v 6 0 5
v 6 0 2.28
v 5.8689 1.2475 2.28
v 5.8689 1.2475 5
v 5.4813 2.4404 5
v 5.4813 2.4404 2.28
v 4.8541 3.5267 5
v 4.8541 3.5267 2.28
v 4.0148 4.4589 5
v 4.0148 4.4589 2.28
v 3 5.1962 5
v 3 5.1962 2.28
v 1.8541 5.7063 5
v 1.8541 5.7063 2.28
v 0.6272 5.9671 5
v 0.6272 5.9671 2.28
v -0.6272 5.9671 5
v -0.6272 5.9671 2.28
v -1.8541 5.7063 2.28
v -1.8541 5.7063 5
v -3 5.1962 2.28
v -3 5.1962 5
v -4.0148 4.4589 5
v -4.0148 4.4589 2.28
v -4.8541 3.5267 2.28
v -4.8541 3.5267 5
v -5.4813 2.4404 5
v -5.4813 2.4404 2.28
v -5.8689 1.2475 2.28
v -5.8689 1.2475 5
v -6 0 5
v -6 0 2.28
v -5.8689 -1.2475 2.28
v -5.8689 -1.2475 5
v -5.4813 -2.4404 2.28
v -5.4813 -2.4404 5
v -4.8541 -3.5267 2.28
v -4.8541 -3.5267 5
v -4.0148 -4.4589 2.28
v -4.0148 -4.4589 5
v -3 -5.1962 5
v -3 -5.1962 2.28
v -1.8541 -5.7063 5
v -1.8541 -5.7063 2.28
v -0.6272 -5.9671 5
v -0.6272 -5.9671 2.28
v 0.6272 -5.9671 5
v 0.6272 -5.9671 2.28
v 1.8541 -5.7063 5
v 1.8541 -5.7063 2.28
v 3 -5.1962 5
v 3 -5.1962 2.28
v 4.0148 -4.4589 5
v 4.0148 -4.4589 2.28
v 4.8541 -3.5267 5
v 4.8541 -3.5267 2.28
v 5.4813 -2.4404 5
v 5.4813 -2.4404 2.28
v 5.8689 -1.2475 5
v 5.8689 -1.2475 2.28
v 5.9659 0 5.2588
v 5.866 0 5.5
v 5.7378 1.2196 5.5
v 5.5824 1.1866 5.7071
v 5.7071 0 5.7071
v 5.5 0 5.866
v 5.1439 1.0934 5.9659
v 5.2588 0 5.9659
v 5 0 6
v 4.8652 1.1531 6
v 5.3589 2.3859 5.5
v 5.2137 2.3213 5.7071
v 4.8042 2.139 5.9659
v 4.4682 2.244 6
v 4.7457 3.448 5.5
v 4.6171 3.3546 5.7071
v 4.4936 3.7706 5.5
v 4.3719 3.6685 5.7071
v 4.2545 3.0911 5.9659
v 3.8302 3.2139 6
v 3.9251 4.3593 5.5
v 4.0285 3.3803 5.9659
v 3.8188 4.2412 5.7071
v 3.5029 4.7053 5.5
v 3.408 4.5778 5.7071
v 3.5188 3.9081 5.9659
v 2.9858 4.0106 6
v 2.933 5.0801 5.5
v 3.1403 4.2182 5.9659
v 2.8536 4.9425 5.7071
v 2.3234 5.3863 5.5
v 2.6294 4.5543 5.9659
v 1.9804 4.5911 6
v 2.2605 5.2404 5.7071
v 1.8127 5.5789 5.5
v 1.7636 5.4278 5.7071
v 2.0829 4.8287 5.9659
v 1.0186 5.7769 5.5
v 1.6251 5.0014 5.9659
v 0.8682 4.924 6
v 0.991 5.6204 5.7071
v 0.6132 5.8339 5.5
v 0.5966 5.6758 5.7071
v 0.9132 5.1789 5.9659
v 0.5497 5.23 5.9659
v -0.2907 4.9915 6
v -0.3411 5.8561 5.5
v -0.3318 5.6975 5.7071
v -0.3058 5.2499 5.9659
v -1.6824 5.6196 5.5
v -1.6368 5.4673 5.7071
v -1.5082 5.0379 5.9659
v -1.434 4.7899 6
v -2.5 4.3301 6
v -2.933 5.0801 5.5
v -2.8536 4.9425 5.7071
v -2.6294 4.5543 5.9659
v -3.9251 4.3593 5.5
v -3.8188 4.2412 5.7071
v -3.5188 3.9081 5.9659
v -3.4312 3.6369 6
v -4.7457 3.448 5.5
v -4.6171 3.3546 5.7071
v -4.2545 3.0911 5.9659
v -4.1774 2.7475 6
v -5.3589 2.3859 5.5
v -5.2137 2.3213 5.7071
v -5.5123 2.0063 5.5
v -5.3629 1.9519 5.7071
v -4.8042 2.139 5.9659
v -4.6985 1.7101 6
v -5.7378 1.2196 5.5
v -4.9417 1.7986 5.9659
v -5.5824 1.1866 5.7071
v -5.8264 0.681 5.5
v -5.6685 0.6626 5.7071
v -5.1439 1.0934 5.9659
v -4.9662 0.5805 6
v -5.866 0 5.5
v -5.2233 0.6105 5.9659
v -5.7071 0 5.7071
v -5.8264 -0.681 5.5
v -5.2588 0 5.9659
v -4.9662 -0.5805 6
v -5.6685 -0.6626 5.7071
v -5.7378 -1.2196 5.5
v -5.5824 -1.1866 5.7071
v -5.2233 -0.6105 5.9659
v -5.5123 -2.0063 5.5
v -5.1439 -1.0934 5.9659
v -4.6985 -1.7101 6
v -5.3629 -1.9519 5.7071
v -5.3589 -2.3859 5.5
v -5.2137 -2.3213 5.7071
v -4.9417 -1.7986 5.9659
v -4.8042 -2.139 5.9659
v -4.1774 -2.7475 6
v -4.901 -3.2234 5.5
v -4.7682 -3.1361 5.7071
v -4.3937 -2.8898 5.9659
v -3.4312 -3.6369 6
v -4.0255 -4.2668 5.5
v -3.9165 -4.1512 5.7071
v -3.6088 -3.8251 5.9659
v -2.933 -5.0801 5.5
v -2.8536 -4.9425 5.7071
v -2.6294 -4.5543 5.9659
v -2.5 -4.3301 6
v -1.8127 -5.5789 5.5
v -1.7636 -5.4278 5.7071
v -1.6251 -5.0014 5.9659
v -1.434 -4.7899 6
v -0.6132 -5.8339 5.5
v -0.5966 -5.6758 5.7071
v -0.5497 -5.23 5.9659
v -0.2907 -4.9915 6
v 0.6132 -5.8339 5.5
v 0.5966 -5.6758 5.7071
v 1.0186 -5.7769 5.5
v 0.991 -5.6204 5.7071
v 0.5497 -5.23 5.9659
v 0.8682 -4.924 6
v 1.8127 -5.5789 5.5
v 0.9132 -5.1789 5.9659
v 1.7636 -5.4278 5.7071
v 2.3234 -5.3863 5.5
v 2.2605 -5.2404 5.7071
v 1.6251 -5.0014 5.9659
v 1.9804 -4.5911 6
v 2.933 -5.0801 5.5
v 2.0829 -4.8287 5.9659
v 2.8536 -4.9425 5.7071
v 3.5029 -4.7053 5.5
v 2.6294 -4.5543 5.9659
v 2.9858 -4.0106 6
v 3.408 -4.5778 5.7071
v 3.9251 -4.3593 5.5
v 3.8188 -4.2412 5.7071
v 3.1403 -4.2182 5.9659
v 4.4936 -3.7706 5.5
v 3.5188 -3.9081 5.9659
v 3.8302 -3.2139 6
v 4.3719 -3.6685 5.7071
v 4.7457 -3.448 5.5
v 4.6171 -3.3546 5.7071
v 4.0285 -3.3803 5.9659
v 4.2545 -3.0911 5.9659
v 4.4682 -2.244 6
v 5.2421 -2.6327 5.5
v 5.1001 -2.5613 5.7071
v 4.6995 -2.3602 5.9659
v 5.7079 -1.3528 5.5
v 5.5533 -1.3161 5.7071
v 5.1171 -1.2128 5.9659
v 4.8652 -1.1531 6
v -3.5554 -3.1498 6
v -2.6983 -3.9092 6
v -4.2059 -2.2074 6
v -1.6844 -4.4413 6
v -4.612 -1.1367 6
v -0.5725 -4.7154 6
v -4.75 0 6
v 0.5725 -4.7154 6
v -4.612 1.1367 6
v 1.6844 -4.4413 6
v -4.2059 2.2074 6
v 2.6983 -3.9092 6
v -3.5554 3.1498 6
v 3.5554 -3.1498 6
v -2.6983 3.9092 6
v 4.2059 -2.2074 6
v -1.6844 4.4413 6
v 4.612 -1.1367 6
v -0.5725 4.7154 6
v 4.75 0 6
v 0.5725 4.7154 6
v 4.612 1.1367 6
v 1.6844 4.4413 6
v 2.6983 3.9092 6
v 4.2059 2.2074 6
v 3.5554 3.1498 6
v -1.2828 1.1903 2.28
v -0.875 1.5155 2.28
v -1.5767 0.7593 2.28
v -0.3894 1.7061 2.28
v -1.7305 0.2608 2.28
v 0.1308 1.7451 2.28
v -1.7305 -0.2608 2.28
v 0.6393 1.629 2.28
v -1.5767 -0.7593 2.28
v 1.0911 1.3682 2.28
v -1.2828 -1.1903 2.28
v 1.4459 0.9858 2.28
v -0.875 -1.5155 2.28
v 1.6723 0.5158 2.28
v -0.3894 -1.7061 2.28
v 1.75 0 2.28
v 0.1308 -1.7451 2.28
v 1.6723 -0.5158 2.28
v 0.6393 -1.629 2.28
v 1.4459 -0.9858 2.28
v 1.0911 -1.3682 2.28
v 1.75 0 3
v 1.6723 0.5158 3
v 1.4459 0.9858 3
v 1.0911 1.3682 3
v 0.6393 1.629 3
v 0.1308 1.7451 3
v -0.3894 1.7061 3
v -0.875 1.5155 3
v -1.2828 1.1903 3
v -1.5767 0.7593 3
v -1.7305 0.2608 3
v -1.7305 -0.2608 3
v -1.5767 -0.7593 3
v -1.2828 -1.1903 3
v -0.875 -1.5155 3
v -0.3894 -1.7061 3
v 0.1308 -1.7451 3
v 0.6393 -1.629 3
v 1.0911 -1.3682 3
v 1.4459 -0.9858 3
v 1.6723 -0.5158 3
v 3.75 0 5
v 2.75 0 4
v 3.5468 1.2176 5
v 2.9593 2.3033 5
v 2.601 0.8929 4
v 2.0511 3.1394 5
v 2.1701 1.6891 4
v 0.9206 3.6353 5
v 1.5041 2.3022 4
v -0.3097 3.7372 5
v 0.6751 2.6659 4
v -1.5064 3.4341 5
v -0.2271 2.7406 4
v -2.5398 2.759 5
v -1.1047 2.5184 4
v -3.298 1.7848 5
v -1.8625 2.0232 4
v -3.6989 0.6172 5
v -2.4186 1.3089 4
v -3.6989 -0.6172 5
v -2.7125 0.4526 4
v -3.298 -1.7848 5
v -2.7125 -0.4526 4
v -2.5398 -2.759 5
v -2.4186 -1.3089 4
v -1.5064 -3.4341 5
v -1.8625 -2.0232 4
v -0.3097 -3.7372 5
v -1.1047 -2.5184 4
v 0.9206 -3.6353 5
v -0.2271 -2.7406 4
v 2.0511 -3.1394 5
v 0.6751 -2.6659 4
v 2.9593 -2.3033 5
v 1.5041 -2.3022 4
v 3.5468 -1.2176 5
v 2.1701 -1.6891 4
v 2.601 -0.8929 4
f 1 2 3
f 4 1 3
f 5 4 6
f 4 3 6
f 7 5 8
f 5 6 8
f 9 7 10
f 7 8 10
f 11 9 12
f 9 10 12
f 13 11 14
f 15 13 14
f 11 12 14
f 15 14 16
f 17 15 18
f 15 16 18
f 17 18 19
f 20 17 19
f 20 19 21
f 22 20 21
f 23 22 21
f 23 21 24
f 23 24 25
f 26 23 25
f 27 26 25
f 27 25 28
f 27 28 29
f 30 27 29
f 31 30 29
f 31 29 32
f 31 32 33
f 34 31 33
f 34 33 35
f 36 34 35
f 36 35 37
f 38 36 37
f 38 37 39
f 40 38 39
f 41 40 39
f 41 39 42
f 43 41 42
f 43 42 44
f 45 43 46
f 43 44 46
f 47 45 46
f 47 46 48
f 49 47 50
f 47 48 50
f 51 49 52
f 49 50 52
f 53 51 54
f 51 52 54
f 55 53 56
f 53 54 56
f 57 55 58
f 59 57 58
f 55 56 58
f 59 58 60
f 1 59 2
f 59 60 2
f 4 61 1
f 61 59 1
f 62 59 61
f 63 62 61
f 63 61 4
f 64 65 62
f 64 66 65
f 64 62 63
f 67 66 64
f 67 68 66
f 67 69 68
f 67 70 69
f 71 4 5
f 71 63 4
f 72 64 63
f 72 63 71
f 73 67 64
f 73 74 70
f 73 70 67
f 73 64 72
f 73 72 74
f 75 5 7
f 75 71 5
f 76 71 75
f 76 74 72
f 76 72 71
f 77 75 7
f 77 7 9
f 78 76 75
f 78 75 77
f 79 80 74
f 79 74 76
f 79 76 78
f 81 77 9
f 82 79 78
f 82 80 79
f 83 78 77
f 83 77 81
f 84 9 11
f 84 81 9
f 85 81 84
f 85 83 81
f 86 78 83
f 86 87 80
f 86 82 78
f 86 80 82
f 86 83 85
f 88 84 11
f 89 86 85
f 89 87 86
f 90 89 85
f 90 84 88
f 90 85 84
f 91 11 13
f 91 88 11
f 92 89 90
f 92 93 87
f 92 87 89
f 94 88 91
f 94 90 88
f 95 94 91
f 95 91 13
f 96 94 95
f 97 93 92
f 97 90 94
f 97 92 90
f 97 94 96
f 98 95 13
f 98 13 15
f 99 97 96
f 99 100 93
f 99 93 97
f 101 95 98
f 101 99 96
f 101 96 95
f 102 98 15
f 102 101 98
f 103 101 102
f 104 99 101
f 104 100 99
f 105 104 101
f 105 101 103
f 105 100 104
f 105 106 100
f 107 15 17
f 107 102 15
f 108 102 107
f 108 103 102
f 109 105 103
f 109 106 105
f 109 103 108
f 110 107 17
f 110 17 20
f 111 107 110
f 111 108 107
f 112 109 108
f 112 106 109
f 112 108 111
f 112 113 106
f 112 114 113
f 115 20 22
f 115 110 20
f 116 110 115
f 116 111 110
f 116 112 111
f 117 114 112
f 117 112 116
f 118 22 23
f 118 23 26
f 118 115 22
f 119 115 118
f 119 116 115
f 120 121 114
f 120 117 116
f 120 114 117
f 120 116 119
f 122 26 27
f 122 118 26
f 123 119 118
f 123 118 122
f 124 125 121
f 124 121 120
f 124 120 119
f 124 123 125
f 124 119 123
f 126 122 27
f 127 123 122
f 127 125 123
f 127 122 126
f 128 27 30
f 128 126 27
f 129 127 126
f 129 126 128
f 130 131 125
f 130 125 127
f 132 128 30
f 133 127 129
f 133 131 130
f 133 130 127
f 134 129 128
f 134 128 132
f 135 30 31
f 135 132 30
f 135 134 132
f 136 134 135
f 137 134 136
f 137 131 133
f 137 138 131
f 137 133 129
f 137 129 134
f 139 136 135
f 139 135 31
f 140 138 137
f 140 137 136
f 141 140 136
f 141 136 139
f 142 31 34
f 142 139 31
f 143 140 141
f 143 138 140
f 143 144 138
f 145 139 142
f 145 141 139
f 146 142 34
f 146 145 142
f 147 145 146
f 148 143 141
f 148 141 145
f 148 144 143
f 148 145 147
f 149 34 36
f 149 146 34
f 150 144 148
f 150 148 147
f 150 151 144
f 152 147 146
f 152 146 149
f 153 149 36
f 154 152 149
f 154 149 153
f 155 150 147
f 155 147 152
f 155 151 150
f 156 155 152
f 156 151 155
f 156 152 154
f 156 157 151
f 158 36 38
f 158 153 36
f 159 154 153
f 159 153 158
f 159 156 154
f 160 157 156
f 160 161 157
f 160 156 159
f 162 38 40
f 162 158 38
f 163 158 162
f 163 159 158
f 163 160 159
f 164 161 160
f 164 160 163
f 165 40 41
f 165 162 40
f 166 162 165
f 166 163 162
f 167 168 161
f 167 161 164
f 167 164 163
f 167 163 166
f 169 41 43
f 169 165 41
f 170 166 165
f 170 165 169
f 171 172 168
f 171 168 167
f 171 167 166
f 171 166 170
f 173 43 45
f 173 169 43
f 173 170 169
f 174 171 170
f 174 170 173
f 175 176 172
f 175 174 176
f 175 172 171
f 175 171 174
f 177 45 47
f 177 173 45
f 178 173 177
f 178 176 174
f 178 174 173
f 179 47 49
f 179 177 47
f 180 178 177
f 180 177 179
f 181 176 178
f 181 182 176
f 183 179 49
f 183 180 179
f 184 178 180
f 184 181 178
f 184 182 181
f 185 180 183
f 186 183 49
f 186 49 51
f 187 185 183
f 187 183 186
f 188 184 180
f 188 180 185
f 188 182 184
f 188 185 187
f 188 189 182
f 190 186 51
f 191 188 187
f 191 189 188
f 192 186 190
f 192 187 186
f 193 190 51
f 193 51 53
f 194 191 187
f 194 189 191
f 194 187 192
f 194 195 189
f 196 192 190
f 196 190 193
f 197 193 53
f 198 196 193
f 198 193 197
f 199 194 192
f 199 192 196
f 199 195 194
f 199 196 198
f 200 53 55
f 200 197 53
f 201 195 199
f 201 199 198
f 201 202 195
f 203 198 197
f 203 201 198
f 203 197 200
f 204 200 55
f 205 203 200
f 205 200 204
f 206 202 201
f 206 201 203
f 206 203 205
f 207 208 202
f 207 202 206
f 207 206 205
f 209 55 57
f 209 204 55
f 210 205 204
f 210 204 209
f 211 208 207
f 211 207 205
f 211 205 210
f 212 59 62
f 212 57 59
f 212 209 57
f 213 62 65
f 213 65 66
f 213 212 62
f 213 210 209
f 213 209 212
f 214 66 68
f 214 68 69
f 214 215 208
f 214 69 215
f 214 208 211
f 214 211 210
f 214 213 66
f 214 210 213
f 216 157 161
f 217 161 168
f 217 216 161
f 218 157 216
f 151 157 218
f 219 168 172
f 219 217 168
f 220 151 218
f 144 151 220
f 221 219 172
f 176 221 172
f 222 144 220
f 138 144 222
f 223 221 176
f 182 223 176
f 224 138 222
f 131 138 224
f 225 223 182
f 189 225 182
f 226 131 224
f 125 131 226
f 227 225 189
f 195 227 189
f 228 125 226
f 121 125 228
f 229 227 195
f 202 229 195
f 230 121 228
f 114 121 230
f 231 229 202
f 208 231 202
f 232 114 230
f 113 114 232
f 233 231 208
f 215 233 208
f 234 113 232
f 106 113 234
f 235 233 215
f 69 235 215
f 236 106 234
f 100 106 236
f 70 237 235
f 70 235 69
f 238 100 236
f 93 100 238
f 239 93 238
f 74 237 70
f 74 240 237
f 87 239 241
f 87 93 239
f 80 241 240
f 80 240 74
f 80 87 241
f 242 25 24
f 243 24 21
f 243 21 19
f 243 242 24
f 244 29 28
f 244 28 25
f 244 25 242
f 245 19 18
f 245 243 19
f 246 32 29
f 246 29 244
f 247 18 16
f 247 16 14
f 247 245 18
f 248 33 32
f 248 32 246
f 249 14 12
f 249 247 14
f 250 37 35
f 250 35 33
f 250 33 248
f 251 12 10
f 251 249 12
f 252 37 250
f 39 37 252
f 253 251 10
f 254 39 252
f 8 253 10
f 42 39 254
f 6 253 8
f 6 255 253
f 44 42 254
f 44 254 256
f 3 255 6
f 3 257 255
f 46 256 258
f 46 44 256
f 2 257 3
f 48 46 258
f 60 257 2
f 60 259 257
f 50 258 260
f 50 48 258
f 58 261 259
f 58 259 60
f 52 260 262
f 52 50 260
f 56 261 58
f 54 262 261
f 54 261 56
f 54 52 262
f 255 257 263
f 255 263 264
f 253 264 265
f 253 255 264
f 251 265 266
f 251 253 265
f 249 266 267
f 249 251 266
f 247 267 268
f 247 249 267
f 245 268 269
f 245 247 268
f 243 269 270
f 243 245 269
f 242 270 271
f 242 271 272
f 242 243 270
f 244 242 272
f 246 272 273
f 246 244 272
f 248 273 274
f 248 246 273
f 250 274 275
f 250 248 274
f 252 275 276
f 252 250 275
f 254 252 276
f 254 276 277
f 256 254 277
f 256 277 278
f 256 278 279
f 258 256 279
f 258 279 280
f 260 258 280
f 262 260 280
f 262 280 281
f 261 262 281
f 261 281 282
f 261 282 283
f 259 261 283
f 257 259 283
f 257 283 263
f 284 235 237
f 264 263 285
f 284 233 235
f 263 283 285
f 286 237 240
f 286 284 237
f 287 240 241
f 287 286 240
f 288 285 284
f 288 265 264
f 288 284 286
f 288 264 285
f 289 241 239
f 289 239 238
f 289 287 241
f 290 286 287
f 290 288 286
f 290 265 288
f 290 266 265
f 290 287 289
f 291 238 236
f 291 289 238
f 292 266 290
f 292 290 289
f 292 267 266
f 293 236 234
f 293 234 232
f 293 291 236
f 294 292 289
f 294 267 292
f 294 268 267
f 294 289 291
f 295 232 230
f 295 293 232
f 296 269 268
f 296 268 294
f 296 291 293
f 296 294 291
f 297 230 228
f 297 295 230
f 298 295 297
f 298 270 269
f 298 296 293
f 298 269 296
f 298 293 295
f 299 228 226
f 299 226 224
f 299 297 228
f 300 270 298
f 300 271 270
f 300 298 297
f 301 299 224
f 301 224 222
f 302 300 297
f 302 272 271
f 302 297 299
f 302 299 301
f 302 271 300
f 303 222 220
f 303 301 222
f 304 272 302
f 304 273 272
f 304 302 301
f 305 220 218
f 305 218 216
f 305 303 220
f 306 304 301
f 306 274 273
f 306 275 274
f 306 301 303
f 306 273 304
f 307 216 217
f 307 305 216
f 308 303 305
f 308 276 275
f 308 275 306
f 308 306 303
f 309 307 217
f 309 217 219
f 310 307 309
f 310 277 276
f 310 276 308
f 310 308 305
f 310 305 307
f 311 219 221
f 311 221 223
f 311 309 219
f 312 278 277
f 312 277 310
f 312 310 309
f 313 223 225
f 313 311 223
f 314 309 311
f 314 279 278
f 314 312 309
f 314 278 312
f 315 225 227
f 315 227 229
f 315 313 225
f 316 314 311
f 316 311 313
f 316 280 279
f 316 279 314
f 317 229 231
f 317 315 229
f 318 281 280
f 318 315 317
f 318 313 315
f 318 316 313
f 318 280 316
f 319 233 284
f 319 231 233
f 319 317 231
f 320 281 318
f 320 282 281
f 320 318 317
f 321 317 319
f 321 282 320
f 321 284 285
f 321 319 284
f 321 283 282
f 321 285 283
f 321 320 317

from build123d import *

# Parameters (mm, degrees)
F0_R        = 6
F0_R_2      = 4
F0_R_3      = 1.75
F1_DEPTH    = 6
F2_R        = 1
F3_SIZE     = 3
F1_FACE_R   = 6
F1_FACE_R_2 = 1.75
F4_DEPTH    = 2.28


with BuildPart() as f1:
    # F0 (on Top) → F1 (new body)
    with BuildSketch(Plane.XY):
        Circle(F0_R)
        Circle(F0_R_2, mode=Mode.SUBTRACT)
        Circle(F0_R_2)
        Circle(F0_R_3, mode=Mode.SUBTRACT)
    extrude(amount=F1_DEPTH)

    # F2
    f2_edges = [f1.edges().sort_by_distance(p)[0] for p in [
        (-6, 0, 6),
    ]]
    fillet(f2_edges, radius=F2_R)

    # F3
    f3_edges = [f1.edges().sort_by_distance(p)[0] for p in [
        (-1.75, 0, 6),
    ]]
    chamfer(f3_edges, length=F3_SIZE)

    # F1_face (on face) → F4 (cut)
    with BuildSketch(Plane(origin=(0, 0, 0), x_dir=(1, 0, 0), z_dir=(0, 0, -1))):
        Circle(F1_FACE_R)
        Circle(F1_FACE_R_2, mode=Mode.SUBTRACT)
    extrude(amount=-F4_DEPTH, mode=Mode.SUBTRACT)


solid = f1.part
